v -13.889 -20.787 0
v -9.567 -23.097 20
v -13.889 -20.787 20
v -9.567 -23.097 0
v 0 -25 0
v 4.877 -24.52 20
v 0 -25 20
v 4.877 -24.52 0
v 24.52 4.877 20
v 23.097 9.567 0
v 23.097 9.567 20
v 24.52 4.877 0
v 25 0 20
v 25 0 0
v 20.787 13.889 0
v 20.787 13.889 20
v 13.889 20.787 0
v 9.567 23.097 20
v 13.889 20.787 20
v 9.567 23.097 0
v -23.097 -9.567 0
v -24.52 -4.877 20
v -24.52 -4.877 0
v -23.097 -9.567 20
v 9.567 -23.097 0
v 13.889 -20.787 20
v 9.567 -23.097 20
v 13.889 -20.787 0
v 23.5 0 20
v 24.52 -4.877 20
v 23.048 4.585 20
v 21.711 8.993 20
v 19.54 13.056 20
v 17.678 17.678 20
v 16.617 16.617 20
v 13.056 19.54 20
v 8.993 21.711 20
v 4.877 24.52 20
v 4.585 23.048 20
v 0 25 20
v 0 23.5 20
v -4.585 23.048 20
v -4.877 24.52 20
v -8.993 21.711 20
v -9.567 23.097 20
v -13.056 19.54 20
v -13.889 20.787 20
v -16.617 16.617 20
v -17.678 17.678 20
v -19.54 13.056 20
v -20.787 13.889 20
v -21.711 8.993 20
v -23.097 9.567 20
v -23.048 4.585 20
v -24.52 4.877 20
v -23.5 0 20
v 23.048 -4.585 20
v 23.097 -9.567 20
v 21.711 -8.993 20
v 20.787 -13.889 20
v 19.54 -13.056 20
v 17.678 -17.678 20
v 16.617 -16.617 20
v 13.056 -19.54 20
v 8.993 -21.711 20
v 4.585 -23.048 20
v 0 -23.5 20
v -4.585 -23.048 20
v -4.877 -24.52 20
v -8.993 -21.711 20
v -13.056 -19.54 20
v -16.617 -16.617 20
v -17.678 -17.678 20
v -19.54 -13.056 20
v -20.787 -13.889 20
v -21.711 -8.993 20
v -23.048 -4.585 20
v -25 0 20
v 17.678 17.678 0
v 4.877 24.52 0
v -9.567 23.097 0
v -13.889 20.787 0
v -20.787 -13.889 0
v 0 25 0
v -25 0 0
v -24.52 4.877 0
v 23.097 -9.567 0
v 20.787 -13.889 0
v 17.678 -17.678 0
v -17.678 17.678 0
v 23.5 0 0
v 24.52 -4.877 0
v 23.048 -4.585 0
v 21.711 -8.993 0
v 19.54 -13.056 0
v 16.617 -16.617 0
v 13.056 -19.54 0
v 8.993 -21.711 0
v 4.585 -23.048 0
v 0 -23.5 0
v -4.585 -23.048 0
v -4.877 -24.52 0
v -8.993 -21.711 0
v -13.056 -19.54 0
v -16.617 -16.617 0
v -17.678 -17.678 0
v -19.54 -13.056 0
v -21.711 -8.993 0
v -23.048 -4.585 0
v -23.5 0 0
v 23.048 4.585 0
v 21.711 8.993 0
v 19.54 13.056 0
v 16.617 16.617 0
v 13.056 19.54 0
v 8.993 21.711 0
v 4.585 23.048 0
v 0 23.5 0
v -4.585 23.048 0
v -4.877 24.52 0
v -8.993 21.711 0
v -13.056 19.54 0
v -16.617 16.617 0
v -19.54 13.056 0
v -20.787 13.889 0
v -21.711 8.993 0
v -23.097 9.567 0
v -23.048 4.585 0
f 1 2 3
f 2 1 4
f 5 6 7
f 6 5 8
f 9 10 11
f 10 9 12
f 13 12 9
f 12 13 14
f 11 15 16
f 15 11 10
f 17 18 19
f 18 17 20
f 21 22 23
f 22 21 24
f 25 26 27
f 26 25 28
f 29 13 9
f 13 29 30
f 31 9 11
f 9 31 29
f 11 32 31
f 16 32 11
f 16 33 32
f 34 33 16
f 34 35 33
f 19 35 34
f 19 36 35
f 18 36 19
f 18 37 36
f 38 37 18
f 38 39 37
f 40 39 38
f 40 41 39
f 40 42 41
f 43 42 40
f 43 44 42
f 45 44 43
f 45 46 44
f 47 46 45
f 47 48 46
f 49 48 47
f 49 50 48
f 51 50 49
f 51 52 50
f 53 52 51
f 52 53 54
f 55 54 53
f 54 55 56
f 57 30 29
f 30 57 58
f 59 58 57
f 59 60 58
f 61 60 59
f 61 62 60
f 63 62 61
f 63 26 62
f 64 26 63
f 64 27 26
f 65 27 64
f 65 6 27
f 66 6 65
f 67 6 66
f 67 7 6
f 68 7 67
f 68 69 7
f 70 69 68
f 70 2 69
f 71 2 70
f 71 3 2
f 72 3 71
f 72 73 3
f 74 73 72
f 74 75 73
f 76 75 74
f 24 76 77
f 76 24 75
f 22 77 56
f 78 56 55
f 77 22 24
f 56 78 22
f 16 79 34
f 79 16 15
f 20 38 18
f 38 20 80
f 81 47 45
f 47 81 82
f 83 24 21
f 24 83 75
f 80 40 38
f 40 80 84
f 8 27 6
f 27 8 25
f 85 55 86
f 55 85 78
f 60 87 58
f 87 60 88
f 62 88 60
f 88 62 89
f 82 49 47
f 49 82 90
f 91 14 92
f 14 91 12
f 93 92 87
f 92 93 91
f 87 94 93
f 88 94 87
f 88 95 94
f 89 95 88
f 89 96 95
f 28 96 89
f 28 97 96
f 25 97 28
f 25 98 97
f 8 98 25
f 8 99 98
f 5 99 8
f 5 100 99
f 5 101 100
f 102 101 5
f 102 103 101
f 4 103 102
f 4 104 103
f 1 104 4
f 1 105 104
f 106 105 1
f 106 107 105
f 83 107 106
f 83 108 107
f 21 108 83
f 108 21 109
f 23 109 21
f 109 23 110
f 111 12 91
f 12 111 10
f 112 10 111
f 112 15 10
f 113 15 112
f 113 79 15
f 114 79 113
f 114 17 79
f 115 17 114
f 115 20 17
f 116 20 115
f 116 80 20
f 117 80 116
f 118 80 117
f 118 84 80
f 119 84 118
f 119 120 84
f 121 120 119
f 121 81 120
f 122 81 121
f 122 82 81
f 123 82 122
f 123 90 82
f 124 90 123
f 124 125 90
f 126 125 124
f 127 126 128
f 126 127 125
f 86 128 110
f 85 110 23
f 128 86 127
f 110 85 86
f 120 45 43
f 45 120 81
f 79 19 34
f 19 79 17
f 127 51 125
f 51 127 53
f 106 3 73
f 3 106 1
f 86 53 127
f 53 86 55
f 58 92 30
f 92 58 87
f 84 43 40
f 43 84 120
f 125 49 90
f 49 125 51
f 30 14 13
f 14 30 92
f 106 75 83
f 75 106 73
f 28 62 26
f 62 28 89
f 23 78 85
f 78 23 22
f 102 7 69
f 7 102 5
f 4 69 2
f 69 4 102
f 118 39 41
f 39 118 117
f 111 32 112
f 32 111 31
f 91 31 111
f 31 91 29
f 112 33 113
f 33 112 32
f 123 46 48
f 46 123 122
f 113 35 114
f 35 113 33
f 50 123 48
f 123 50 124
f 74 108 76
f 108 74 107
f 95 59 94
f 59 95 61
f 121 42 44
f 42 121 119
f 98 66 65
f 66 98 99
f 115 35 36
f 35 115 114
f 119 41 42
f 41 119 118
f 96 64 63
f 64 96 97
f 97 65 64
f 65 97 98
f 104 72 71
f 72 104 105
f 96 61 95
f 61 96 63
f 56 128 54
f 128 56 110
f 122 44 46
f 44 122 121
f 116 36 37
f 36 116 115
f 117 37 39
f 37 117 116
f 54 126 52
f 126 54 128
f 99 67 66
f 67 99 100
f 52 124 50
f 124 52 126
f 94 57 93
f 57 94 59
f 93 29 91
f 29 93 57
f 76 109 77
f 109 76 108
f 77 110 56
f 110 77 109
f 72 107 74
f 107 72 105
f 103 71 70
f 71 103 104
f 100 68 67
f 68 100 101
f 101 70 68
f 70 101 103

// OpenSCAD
$fn = 32;

// ----------------------------------------------------------------------
// Thin tube: 1.5 mm wall
// ----------------------------------------------------------------------

// --- parameters (mm) ---
tube_od = 50;             // outer diameter
tube_h = 20;              // height, Z
wall = 1.5;               // wall thickness

difference() {
  cylinder(h = tube_h, d = tube_od);
  translate([0, 0, -1]) cylinder(h = tube_h + 2, d = tube_od - 2 * wall);
}
